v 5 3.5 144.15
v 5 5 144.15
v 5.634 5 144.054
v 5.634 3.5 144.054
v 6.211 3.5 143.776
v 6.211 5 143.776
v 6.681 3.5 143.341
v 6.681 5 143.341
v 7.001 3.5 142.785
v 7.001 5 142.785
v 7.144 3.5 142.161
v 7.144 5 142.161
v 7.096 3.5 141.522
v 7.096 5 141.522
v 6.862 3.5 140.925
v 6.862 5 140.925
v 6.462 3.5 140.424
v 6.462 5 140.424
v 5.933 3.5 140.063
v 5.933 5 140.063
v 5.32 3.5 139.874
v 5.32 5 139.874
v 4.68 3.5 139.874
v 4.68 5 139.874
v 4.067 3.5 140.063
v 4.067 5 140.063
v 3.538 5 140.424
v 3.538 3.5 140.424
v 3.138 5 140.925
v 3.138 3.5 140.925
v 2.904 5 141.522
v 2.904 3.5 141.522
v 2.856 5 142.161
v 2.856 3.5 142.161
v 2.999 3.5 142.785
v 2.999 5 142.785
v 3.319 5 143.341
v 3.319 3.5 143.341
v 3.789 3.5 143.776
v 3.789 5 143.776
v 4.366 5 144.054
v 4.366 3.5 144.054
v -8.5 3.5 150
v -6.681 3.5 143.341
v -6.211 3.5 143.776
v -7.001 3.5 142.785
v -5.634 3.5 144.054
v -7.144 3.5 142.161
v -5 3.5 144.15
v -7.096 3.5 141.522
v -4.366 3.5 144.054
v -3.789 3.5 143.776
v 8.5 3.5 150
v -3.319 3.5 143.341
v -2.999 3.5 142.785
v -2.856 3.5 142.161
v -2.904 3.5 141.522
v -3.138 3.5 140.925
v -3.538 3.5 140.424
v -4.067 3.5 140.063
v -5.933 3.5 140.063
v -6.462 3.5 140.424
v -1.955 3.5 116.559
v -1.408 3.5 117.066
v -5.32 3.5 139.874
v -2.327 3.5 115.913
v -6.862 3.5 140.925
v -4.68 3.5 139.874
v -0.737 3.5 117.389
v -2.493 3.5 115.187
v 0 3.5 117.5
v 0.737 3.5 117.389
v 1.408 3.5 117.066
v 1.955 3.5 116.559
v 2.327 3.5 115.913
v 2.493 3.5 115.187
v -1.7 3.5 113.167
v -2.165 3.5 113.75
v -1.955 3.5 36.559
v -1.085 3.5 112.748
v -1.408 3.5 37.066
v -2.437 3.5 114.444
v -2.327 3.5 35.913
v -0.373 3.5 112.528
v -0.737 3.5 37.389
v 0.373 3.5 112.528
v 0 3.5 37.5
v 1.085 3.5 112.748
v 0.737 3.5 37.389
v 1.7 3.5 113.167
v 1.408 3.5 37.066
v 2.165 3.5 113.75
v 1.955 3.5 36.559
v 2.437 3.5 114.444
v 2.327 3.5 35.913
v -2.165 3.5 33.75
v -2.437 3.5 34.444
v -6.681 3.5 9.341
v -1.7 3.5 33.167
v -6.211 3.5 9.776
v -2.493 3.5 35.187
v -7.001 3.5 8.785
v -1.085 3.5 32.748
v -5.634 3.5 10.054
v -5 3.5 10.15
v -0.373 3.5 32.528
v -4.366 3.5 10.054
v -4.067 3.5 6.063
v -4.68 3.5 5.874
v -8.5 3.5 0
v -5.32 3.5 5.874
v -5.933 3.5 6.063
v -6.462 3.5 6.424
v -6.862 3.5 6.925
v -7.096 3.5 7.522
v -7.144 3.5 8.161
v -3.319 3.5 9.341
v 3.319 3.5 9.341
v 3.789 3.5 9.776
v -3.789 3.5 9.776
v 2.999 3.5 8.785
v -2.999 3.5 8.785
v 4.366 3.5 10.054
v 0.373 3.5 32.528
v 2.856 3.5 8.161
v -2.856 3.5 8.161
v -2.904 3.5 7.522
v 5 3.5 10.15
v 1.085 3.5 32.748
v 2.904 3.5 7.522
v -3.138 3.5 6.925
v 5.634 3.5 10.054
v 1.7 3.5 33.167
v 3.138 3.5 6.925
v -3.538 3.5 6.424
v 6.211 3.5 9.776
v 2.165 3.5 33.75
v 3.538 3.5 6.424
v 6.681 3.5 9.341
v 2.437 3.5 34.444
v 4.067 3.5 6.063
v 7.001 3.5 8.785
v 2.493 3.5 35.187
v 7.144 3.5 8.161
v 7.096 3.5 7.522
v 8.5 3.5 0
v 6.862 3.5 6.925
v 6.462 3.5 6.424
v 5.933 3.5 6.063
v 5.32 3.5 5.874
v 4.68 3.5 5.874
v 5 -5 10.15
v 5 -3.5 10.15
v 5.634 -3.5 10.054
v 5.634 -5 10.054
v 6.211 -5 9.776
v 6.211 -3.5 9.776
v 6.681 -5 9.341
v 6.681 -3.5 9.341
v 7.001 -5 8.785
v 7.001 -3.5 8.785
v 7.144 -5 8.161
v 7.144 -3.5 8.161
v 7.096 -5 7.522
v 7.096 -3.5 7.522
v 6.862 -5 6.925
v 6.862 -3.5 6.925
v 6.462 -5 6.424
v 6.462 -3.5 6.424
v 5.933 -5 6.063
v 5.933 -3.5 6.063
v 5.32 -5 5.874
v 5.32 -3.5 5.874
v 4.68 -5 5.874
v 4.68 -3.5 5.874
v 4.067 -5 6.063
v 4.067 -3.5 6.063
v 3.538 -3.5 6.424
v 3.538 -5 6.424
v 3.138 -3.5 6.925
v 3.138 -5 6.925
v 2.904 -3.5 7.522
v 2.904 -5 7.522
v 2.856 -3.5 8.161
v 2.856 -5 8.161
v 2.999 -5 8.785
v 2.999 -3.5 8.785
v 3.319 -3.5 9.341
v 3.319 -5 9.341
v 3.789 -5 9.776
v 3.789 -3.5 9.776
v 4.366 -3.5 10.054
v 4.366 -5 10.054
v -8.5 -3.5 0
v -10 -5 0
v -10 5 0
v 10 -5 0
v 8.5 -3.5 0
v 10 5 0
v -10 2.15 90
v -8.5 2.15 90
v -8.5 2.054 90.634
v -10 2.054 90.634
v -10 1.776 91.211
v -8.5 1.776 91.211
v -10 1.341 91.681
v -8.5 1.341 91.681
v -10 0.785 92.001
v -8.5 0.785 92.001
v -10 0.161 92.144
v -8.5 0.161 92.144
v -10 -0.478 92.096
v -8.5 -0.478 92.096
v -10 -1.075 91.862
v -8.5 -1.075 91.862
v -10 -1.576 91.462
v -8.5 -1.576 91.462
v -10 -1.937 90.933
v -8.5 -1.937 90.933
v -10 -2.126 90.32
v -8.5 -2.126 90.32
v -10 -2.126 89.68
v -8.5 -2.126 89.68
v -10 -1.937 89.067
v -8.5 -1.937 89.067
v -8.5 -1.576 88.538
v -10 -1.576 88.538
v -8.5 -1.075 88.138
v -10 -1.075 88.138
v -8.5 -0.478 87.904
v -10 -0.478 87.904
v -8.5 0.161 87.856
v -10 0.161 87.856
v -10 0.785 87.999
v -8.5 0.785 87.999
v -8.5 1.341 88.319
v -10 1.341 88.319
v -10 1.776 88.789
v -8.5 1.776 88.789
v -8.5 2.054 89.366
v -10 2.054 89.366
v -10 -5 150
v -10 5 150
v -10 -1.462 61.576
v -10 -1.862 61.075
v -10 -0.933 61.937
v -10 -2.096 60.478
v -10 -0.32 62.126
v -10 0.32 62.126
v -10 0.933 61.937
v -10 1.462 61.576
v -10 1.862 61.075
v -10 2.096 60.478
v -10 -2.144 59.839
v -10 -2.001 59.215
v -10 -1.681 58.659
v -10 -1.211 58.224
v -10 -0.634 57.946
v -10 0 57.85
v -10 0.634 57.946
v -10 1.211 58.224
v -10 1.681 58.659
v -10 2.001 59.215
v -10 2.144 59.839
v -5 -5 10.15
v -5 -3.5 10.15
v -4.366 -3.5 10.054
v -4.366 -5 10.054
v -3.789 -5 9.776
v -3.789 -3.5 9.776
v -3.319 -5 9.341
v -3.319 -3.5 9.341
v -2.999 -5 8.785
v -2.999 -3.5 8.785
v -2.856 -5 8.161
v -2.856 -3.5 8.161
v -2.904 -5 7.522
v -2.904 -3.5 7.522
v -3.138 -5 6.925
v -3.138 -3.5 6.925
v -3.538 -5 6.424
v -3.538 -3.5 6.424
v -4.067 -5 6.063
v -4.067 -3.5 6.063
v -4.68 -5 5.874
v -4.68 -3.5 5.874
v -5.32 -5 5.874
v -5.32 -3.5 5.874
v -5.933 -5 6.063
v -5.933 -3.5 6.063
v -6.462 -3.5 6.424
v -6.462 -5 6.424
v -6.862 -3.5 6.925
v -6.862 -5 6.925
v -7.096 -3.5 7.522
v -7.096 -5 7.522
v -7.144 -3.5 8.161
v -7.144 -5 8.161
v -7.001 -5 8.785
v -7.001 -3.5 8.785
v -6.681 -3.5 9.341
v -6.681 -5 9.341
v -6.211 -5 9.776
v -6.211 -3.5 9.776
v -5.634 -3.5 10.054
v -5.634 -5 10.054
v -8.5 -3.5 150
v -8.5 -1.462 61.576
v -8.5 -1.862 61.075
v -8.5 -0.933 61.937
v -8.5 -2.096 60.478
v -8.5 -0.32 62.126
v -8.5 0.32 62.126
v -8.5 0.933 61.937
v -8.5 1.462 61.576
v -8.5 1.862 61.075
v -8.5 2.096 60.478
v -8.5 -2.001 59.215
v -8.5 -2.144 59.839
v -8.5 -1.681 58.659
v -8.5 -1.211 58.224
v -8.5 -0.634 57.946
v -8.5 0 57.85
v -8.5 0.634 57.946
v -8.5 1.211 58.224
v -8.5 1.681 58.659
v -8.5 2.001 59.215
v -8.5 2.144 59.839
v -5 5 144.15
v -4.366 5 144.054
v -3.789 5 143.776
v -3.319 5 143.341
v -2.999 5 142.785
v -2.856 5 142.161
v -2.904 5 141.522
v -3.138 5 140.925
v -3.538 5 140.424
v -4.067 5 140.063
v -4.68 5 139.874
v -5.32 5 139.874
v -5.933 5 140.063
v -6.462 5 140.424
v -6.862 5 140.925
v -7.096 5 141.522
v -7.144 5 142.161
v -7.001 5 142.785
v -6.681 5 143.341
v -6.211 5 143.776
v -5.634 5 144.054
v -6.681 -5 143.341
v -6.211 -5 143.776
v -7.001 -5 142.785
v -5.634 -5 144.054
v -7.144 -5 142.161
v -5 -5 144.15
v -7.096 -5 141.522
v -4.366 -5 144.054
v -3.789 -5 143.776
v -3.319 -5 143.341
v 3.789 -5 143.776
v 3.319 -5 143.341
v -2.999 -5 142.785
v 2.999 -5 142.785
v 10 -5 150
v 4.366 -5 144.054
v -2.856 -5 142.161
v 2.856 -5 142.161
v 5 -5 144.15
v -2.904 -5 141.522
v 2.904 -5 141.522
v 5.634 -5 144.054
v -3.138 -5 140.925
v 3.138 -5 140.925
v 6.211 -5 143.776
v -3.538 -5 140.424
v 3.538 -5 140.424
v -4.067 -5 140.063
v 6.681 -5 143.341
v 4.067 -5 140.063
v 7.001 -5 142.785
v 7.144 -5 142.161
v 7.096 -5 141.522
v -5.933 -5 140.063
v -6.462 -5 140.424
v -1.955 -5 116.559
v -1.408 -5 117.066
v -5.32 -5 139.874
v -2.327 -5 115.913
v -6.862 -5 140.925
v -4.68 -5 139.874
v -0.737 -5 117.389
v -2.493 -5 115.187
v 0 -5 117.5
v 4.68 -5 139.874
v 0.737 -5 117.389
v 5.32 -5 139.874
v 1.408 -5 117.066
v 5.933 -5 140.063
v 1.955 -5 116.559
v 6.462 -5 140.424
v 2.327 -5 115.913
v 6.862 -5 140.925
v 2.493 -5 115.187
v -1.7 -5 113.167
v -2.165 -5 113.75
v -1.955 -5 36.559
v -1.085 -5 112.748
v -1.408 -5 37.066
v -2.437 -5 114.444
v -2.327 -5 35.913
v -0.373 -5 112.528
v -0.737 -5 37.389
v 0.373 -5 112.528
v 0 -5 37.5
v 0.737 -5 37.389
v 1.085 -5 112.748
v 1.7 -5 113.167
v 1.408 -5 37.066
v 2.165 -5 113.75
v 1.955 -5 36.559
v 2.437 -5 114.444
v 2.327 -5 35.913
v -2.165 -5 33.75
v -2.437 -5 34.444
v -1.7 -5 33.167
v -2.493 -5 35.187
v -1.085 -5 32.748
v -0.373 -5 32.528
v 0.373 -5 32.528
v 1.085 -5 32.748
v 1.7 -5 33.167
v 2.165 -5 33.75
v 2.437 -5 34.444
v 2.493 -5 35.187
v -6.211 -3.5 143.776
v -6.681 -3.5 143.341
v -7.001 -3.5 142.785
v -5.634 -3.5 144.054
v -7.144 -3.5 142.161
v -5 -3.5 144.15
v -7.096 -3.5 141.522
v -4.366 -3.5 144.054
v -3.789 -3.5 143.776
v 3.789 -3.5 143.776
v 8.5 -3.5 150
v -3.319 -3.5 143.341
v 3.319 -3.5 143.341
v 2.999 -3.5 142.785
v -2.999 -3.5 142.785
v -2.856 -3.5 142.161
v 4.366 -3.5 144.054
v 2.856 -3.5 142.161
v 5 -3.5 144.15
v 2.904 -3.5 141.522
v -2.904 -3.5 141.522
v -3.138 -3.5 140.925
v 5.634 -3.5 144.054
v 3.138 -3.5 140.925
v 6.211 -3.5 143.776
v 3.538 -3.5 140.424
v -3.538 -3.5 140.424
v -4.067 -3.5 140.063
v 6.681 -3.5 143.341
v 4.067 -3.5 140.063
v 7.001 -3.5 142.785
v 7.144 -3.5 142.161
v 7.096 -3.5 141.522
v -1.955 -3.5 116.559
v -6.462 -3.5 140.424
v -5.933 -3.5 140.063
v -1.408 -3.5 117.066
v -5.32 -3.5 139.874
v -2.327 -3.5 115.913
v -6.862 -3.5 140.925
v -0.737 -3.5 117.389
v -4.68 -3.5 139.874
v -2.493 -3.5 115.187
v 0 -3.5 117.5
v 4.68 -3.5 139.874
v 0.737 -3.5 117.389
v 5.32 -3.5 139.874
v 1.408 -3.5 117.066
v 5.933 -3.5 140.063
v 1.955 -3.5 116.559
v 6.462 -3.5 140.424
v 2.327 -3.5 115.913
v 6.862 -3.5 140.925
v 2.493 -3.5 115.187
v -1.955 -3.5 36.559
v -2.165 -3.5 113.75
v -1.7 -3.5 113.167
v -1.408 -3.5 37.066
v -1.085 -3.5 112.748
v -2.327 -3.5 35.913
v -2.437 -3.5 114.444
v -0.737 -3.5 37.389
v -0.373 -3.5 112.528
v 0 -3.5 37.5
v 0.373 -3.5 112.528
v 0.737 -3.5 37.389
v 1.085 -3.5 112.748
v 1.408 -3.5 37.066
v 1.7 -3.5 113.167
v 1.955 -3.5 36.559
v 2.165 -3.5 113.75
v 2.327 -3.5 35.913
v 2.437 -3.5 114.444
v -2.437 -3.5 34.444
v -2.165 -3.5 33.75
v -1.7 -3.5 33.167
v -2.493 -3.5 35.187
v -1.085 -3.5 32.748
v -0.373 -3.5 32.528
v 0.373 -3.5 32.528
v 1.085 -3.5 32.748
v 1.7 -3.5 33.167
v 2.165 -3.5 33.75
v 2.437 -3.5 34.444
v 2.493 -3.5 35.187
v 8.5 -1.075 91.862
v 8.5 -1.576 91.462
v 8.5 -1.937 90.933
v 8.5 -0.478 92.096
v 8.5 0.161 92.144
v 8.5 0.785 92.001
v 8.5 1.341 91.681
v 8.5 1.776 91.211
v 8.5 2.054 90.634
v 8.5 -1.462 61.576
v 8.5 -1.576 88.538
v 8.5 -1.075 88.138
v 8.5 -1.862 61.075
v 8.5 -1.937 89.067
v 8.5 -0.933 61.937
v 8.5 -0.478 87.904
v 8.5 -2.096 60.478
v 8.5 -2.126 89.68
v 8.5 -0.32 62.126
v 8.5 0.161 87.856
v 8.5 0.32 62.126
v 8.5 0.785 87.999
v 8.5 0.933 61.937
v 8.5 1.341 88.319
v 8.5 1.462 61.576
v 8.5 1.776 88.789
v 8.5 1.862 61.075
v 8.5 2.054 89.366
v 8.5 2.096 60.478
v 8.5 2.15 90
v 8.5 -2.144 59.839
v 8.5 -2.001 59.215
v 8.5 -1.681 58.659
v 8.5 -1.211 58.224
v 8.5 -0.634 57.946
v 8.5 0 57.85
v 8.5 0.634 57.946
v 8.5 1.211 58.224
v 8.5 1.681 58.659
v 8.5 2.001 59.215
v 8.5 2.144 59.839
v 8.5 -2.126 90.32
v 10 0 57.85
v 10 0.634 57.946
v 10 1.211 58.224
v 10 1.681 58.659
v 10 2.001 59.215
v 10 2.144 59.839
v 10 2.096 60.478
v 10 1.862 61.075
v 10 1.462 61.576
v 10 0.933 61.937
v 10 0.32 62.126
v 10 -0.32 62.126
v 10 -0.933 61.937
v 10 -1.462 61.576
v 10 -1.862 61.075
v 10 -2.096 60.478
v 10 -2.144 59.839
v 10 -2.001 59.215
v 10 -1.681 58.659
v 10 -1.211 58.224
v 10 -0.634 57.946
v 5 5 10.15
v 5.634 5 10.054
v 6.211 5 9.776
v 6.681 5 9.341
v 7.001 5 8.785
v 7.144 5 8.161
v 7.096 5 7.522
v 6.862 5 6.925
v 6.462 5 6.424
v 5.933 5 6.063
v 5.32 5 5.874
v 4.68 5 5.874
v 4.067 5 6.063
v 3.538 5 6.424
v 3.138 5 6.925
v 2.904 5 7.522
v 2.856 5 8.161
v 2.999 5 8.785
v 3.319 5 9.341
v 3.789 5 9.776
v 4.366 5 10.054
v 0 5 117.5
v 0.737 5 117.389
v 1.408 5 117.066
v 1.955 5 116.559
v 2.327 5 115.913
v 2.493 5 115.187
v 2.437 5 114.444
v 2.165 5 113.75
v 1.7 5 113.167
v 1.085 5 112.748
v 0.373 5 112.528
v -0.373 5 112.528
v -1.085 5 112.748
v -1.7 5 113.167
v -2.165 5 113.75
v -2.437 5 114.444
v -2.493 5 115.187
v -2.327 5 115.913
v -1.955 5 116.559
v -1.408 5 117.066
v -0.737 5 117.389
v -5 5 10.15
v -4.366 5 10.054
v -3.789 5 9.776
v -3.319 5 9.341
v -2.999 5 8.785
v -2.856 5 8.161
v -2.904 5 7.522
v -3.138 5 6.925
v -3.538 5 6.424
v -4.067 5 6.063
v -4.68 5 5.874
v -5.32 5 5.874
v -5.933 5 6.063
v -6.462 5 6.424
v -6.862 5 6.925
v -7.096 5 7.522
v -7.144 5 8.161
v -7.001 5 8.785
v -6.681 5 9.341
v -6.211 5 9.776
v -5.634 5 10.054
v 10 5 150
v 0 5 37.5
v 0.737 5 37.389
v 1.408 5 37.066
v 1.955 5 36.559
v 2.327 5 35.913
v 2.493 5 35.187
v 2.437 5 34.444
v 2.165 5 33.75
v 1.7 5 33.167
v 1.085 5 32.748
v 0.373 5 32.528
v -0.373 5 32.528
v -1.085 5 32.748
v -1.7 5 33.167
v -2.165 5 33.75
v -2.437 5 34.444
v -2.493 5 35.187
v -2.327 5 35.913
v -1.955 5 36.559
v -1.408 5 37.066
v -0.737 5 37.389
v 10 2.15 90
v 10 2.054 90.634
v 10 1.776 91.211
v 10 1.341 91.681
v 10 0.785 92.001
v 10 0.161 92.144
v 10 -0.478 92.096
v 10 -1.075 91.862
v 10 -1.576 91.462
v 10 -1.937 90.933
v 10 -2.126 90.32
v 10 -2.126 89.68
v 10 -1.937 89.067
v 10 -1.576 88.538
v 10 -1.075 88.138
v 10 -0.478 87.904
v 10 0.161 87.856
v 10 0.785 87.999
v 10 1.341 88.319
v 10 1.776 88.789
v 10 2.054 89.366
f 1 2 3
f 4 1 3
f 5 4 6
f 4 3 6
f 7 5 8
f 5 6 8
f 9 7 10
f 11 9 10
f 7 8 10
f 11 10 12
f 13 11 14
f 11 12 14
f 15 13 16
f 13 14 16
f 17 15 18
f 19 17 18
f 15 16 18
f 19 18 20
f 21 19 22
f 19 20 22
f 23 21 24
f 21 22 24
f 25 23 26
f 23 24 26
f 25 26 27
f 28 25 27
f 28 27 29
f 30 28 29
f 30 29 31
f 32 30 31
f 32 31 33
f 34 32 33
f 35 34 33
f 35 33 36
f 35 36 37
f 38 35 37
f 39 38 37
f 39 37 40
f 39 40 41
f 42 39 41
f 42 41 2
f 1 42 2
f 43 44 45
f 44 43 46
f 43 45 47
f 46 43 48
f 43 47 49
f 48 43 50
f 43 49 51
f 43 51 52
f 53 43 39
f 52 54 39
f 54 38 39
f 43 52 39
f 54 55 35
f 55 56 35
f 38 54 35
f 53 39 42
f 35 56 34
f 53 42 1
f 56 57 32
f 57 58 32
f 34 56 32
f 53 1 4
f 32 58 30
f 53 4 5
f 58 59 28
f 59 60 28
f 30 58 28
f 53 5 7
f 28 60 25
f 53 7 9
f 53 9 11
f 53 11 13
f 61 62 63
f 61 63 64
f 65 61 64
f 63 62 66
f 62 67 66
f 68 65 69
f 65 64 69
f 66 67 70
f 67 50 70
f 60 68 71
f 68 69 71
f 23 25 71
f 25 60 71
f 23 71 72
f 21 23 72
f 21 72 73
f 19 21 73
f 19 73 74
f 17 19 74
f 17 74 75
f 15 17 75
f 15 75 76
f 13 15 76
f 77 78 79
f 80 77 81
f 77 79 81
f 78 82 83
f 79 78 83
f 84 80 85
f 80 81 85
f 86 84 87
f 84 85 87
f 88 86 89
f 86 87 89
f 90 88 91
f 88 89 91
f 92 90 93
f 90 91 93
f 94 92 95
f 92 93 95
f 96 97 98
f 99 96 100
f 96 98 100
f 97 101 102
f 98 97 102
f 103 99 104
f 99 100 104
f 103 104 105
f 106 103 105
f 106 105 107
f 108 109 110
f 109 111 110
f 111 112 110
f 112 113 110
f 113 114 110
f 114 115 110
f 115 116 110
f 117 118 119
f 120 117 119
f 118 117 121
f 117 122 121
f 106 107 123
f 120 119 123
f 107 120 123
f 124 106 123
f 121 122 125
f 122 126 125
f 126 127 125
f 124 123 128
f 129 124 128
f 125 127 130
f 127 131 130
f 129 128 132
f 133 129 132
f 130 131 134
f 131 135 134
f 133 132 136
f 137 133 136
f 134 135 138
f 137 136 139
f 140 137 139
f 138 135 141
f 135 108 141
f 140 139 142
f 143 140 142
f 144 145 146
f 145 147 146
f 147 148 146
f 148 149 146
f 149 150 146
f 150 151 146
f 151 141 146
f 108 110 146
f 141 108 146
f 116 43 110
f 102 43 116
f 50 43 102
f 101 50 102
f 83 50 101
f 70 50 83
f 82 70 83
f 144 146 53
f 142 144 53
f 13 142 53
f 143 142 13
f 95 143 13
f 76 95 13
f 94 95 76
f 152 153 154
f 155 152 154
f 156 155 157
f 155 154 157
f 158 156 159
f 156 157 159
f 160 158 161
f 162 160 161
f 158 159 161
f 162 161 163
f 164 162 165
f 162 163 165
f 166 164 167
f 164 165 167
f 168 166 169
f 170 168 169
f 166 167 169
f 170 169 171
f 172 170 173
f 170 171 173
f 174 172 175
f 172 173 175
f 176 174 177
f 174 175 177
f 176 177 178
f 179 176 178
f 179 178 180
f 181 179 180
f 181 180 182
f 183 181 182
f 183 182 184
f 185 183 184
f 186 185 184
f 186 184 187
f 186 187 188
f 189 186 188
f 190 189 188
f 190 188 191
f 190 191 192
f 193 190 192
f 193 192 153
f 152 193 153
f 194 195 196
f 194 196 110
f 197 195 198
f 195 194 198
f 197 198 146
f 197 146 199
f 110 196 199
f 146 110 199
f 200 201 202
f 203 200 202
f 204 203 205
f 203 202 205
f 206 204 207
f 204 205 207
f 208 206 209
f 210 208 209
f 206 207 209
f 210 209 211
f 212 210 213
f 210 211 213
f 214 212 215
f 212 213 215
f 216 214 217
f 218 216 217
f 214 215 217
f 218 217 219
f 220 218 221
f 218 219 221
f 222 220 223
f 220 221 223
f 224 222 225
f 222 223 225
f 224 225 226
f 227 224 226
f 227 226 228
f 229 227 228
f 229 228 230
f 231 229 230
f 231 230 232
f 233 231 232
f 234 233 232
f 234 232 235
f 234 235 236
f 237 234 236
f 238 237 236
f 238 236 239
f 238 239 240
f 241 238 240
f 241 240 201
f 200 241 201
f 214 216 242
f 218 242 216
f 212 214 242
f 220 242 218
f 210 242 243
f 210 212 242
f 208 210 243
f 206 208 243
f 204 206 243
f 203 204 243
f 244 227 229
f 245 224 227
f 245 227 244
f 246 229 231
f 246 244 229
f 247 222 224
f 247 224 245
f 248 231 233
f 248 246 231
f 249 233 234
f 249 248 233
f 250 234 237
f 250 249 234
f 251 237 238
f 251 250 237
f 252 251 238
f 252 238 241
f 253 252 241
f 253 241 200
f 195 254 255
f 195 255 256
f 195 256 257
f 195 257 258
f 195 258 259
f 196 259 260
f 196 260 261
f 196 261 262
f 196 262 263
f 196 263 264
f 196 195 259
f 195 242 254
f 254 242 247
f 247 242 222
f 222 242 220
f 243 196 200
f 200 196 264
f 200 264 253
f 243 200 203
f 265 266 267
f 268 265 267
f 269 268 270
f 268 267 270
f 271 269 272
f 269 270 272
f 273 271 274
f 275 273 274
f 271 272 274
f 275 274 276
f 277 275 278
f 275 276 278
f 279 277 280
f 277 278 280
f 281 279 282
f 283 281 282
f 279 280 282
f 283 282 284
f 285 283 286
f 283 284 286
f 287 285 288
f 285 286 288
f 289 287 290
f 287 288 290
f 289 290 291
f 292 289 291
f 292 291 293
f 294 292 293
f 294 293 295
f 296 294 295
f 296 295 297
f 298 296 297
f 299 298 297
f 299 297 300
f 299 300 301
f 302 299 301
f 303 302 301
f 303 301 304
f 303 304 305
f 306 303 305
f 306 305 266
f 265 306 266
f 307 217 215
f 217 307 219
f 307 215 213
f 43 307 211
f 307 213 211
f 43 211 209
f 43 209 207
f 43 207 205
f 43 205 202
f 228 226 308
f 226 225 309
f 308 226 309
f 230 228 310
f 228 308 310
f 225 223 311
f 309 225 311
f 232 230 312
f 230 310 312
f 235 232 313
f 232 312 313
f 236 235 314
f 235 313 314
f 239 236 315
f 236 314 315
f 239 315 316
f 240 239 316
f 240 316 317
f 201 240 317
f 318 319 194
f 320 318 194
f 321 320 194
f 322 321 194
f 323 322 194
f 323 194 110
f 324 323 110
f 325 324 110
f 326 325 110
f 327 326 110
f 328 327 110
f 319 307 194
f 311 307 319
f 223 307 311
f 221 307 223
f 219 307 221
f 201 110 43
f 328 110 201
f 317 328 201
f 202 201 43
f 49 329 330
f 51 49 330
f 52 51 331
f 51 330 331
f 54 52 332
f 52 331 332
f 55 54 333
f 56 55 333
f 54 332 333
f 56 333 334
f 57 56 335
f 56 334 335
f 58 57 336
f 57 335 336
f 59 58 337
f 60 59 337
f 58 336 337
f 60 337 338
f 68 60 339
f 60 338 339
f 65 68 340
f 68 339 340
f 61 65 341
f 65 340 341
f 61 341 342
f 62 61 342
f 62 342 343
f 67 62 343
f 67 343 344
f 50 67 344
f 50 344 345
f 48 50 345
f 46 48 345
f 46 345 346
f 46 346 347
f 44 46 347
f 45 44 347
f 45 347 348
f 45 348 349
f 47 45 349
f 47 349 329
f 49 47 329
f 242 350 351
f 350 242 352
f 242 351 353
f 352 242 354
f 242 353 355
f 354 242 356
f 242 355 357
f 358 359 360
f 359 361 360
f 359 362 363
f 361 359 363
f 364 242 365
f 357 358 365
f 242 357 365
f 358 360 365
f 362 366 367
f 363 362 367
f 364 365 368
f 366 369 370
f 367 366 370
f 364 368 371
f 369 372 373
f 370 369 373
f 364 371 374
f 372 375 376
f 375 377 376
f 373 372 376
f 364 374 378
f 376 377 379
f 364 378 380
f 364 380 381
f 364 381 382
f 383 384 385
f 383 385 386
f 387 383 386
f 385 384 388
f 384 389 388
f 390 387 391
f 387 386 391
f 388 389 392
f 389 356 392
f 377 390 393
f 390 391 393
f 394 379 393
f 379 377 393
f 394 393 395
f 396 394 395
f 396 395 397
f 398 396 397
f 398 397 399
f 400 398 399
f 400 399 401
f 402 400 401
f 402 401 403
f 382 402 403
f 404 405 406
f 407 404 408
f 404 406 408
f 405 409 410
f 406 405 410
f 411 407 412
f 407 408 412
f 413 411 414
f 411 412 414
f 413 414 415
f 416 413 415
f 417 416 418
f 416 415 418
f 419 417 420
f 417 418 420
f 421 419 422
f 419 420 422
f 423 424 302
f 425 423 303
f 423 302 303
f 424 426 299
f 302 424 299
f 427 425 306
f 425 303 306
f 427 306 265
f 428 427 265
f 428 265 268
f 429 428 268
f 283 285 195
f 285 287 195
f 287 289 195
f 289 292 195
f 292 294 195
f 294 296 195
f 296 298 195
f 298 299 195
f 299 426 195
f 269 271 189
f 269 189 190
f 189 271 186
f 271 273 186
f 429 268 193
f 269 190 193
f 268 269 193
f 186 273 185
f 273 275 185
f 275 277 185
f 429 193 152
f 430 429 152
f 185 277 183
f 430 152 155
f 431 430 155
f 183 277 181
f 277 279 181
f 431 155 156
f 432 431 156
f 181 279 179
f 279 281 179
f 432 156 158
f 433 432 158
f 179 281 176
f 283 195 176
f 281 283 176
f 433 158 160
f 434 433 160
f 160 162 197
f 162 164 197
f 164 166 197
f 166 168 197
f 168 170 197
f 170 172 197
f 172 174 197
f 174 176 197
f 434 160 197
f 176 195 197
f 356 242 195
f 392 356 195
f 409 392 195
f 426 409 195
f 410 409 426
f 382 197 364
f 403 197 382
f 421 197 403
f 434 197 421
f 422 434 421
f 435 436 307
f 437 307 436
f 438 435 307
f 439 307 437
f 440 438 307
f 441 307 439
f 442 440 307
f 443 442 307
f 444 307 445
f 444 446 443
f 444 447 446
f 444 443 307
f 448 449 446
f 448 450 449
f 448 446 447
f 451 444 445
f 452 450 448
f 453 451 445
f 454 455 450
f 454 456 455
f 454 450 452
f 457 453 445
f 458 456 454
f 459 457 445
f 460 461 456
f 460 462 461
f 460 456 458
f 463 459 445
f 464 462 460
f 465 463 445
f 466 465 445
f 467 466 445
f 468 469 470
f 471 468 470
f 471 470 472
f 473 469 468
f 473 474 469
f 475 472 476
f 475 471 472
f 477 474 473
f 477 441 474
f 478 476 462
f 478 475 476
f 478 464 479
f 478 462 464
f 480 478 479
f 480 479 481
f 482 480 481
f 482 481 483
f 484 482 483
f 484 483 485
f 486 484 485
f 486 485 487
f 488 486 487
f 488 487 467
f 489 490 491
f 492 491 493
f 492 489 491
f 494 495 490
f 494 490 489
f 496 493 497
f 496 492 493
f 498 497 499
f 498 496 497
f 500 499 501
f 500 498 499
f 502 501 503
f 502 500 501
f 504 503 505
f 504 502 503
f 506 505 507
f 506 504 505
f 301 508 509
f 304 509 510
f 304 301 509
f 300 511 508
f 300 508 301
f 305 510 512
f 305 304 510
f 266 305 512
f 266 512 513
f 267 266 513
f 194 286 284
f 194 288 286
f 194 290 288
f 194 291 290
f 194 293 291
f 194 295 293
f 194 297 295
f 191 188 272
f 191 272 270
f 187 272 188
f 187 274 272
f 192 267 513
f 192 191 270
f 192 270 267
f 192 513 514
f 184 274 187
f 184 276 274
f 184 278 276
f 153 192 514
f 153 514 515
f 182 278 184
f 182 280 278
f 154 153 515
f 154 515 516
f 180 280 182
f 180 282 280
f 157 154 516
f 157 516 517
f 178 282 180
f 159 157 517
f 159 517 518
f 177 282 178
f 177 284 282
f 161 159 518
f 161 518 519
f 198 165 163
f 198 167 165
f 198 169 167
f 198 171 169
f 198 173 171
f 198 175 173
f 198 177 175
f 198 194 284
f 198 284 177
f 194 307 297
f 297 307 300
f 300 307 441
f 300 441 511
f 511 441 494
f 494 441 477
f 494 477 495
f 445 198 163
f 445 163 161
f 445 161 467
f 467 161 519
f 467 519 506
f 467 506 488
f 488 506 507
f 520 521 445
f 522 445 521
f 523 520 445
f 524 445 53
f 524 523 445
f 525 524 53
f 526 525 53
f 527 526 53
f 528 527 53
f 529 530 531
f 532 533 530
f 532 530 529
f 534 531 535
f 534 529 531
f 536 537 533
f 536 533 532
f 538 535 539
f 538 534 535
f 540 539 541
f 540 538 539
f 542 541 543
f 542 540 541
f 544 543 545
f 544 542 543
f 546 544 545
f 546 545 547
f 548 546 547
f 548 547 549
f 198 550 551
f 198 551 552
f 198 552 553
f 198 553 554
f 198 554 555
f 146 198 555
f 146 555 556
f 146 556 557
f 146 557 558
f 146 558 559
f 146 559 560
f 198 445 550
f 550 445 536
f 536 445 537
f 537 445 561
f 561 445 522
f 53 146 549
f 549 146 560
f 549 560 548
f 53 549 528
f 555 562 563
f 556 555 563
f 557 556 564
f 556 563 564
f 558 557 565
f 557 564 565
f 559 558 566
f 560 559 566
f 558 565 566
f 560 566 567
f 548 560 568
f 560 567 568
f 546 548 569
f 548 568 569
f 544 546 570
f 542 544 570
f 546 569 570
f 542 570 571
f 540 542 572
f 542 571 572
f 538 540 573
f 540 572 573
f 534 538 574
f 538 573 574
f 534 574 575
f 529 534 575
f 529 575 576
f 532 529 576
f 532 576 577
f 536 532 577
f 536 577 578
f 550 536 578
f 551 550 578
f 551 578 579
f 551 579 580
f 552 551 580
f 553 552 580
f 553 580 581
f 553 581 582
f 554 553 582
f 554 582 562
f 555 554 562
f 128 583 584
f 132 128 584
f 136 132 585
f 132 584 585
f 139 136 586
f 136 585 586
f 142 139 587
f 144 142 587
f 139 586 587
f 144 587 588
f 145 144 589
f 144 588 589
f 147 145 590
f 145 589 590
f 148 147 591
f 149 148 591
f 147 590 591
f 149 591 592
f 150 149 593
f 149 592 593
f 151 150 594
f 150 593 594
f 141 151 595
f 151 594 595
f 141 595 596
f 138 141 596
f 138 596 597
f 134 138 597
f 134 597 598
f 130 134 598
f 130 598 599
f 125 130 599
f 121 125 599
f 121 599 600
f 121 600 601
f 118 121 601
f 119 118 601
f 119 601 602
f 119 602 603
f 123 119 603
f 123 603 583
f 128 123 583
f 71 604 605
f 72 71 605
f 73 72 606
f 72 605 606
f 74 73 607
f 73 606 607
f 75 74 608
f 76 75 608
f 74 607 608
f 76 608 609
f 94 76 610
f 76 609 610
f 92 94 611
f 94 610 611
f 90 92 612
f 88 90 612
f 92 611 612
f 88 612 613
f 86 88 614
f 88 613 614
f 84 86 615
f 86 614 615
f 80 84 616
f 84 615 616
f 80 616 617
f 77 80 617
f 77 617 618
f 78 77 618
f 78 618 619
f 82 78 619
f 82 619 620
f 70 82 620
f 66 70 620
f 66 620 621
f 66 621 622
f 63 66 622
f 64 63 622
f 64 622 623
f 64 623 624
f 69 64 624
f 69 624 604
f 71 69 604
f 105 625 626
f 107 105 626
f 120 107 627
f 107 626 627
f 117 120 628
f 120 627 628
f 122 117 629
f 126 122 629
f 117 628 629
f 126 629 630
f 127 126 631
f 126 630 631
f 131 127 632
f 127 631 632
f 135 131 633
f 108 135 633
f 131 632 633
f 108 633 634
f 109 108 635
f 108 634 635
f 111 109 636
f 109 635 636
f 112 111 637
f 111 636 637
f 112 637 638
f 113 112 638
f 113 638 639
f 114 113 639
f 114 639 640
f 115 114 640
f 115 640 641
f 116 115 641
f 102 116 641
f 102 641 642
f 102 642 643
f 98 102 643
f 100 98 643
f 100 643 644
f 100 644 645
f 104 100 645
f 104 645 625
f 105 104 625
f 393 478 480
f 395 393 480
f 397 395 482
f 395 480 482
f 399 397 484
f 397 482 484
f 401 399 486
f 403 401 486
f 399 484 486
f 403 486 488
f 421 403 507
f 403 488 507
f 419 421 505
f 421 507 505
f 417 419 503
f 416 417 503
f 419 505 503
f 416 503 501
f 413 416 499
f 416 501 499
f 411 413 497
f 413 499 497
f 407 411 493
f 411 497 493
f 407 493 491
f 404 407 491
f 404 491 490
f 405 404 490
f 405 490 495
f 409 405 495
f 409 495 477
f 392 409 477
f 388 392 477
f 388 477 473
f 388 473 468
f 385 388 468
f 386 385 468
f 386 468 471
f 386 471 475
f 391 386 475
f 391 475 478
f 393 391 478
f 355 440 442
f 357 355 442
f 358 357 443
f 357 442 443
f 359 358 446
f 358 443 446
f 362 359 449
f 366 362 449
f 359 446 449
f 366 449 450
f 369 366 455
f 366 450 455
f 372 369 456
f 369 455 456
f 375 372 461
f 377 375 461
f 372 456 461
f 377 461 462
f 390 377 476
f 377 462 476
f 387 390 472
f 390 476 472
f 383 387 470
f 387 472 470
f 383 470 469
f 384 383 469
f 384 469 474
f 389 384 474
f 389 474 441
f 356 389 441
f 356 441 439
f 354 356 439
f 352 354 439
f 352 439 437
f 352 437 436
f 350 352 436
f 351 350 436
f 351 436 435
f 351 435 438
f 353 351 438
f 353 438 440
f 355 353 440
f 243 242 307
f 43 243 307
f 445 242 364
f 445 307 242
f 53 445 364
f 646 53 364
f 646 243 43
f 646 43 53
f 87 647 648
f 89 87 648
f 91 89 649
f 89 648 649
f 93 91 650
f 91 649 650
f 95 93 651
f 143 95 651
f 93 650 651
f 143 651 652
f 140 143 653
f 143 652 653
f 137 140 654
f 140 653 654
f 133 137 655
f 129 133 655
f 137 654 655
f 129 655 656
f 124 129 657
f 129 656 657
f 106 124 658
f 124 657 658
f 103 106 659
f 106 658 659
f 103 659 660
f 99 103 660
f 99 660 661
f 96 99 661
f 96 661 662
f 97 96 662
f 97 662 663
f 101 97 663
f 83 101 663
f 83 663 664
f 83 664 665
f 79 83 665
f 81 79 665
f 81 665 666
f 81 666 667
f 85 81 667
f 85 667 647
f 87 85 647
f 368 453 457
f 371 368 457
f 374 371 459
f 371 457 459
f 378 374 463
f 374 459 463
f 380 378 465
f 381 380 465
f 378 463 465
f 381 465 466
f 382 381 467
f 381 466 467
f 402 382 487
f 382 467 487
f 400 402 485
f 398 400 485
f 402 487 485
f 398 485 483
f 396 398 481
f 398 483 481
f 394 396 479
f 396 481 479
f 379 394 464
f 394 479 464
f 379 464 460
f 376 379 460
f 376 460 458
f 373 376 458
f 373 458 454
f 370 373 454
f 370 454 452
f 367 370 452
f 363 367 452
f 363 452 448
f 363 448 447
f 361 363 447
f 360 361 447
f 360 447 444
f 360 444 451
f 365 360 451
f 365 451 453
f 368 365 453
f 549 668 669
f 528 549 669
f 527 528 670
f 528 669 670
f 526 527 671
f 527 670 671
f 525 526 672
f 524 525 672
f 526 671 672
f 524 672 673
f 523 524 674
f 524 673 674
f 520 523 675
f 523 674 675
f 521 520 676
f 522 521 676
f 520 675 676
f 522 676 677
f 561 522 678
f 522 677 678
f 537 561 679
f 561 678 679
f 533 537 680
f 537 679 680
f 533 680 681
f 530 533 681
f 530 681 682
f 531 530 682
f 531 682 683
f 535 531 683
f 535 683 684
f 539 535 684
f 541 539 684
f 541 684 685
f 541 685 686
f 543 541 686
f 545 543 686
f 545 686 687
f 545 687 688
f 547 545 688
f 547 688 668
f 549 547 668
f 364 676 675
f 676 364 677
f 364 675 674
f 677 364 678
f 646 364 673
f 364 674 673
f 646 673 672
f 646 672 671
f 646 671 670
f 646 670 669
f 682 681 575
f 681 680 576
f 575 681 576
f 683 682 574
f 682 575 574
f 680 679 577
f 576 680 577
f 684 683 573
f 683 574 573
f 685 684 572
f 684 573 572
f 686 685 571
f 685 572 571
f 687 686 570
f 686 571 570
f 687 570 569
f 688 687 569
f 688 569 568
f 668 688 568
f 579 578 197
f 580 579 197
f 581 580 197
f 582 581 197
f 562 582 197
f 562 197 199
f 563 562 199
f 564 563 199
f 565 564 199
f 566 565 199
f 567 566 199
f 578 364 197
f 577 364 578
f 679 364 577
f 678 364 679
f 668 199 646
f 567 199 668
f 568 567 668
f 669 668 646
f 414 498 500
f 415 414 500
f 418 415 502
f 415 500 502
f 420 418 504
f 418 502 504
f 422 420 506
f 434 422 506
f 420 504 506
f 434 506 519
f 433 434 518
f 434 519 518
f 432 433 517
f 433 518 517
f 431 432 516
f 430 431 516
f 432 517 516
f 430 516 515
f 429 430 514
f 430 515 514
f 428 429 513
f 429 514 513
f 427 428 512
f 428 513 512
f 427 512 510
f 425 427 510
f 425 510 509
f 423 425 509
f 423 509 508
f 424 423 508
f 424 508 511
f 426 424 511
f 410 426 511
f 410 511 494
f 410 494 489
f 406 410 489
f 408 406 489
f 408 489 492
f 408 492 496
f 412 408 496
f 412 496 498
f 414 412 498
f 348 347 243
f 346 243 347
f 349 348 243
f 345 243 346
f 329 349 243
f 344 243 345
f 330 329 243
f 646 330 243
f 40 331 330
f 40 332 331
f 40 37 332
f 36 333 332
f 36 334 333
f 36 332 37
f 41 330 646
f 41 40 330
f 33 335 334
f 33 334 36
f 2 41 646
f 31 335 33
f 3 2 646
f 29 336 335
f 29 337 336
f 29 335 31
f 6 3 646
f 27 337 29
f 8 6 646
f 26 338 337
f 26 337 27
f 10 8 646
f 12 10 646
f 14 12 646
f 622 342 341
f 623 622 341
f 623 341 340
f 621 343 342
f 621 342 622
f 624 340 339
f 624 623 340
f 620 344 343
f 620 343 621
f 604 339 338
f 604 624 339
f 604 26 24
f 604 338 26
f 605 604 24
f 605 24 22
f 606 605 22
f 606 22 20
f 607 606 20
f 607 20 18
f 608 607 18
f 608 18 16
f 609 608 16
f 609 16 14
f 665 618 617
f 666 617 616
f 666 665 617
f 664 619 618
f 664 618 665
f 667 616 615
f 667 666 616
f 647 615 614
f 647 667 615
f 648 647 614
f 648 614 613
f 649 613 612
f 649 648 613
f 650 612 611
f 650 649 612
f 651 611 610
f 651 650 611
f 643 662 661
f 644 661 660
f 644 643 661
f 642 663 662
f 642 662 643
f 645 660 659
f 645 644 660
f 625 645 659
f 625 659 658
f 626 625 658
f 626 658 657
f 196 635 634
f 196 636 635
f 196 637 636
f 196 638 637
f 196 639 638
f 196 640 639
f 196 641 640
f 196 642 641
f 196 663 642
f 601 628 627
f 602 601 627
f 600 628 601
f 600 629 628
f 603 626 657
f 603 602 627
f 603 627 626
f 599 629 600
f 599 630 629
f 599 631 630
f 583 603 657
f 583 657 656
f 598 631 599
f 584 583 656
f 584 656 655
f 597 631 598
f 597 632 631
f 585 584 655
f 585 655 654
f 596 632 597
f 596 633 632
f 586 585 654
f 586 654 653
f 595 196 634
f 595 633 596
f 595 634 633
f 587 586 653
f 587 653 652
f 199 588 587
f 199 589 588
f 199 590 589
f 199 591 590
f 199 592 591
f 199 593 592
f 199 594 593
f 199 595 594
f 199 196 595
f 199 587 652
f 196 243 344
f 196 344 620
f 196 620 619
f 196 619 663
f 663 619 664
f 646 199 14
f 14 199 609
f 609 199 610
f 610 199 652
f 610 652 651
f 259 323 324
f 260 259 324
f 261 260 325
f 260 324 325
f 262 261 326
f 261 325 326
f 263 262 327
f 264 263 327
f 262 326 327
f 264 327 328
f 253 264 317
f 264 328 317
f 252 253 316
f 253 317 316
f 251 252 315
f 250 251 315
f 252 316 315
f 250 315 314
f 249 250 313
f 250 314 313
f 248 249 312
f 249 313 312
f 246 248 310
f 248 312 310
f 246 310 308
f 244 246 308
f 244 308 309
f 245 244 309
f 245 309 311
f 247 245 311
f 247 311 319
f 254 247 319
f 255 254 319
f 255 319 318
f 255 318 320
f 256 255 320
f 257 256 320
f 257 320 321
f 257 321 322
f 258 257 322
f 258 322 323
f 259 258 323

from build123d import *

# Parameters (mm, degrees)
SKETCH_1_W          = 20
SKETCH_1_H          = 10
SKETCH_1_W_2        = 17
SKETCH_1_H_2        = 7
EXTRUDE_1_DEPTH     = 150
SKETCH_2_R          = 2.15
SKETCH_2_R_2        = 2.5
CUT_EXTRUDE_1_DEPTH = 151.665191733
SKETCH_3_R          = 2.15
CUT_EXTRUDE_2_DEPTH = 152.410039297


with BuildPart() as part:
    # ｽｹｯﾁ1 → 押し出し-薄板1 (new body)
    with BuildSketch(Plane.XY):
        Rectangle(SKETCH_1_W, SKETCH_1_H)
        Rectangle(SKETCH_1_W_2, SKETCH_1_H_2, mode=Mode.SUBTRACT)
    extrude(amount=EXTRUDE_1_DEPTH)

    # ｽｹｯﾁ2 → ｶｯﾄ - 押し出し1 (cut, through all)
    with BuildSketch(Plane(origin=(0, 5, 0), x_dir=(1, 0, 0), z_dir=(0, 1, 0))):
        with Locations(Location((5, -142, 0), (0, 0, 270))):
            Circle(SKETCH_2_R)
        with Locations(Location((-5, -142, 0), (0, 0, 270))):
            Circle(SKETCH_2_R)
        with Locations(Location((5, -8, 0), (0, 0, 270))):
            Circle(SKETCH_2_R)
        with Locations(Location((-5, -8, 0), (0, 0, 270))):
            Circle(SKETCH_2_R)
        with Locations(Location((0, -35, 0), (0, 0, 270))):
            Circle(SKETCH_2_R_2)
        with Locations(Location((0, -115, 0), (0, 0, 270))):
            Circle(SKETCH_2_R_2)
    extrude(amount=-CUT_EXTRUDE_1_DEPTH, mode=Mode.SUBTRACT)

    # ｽｹｯﾁ3 → ｶｯﾄ - 押し出し2 (cut, through all)
    with BuildSketch(Plane(origin=(10, 0, 0), x_dir=(0, 0, -1), z_dir=(1, 0, 0))):
        with Locations((-60, 0)):
            Circle(SKETCH_3_R)
        with Locations(Location((-90, 0, 0), (0, 0, 90))):
            Circle(SKETCH_3_R)
    extrude(amount=-CUT_EXTRUDE_2_DEPTH, mode=Mode.SUBTRACT)


solid = part.part
